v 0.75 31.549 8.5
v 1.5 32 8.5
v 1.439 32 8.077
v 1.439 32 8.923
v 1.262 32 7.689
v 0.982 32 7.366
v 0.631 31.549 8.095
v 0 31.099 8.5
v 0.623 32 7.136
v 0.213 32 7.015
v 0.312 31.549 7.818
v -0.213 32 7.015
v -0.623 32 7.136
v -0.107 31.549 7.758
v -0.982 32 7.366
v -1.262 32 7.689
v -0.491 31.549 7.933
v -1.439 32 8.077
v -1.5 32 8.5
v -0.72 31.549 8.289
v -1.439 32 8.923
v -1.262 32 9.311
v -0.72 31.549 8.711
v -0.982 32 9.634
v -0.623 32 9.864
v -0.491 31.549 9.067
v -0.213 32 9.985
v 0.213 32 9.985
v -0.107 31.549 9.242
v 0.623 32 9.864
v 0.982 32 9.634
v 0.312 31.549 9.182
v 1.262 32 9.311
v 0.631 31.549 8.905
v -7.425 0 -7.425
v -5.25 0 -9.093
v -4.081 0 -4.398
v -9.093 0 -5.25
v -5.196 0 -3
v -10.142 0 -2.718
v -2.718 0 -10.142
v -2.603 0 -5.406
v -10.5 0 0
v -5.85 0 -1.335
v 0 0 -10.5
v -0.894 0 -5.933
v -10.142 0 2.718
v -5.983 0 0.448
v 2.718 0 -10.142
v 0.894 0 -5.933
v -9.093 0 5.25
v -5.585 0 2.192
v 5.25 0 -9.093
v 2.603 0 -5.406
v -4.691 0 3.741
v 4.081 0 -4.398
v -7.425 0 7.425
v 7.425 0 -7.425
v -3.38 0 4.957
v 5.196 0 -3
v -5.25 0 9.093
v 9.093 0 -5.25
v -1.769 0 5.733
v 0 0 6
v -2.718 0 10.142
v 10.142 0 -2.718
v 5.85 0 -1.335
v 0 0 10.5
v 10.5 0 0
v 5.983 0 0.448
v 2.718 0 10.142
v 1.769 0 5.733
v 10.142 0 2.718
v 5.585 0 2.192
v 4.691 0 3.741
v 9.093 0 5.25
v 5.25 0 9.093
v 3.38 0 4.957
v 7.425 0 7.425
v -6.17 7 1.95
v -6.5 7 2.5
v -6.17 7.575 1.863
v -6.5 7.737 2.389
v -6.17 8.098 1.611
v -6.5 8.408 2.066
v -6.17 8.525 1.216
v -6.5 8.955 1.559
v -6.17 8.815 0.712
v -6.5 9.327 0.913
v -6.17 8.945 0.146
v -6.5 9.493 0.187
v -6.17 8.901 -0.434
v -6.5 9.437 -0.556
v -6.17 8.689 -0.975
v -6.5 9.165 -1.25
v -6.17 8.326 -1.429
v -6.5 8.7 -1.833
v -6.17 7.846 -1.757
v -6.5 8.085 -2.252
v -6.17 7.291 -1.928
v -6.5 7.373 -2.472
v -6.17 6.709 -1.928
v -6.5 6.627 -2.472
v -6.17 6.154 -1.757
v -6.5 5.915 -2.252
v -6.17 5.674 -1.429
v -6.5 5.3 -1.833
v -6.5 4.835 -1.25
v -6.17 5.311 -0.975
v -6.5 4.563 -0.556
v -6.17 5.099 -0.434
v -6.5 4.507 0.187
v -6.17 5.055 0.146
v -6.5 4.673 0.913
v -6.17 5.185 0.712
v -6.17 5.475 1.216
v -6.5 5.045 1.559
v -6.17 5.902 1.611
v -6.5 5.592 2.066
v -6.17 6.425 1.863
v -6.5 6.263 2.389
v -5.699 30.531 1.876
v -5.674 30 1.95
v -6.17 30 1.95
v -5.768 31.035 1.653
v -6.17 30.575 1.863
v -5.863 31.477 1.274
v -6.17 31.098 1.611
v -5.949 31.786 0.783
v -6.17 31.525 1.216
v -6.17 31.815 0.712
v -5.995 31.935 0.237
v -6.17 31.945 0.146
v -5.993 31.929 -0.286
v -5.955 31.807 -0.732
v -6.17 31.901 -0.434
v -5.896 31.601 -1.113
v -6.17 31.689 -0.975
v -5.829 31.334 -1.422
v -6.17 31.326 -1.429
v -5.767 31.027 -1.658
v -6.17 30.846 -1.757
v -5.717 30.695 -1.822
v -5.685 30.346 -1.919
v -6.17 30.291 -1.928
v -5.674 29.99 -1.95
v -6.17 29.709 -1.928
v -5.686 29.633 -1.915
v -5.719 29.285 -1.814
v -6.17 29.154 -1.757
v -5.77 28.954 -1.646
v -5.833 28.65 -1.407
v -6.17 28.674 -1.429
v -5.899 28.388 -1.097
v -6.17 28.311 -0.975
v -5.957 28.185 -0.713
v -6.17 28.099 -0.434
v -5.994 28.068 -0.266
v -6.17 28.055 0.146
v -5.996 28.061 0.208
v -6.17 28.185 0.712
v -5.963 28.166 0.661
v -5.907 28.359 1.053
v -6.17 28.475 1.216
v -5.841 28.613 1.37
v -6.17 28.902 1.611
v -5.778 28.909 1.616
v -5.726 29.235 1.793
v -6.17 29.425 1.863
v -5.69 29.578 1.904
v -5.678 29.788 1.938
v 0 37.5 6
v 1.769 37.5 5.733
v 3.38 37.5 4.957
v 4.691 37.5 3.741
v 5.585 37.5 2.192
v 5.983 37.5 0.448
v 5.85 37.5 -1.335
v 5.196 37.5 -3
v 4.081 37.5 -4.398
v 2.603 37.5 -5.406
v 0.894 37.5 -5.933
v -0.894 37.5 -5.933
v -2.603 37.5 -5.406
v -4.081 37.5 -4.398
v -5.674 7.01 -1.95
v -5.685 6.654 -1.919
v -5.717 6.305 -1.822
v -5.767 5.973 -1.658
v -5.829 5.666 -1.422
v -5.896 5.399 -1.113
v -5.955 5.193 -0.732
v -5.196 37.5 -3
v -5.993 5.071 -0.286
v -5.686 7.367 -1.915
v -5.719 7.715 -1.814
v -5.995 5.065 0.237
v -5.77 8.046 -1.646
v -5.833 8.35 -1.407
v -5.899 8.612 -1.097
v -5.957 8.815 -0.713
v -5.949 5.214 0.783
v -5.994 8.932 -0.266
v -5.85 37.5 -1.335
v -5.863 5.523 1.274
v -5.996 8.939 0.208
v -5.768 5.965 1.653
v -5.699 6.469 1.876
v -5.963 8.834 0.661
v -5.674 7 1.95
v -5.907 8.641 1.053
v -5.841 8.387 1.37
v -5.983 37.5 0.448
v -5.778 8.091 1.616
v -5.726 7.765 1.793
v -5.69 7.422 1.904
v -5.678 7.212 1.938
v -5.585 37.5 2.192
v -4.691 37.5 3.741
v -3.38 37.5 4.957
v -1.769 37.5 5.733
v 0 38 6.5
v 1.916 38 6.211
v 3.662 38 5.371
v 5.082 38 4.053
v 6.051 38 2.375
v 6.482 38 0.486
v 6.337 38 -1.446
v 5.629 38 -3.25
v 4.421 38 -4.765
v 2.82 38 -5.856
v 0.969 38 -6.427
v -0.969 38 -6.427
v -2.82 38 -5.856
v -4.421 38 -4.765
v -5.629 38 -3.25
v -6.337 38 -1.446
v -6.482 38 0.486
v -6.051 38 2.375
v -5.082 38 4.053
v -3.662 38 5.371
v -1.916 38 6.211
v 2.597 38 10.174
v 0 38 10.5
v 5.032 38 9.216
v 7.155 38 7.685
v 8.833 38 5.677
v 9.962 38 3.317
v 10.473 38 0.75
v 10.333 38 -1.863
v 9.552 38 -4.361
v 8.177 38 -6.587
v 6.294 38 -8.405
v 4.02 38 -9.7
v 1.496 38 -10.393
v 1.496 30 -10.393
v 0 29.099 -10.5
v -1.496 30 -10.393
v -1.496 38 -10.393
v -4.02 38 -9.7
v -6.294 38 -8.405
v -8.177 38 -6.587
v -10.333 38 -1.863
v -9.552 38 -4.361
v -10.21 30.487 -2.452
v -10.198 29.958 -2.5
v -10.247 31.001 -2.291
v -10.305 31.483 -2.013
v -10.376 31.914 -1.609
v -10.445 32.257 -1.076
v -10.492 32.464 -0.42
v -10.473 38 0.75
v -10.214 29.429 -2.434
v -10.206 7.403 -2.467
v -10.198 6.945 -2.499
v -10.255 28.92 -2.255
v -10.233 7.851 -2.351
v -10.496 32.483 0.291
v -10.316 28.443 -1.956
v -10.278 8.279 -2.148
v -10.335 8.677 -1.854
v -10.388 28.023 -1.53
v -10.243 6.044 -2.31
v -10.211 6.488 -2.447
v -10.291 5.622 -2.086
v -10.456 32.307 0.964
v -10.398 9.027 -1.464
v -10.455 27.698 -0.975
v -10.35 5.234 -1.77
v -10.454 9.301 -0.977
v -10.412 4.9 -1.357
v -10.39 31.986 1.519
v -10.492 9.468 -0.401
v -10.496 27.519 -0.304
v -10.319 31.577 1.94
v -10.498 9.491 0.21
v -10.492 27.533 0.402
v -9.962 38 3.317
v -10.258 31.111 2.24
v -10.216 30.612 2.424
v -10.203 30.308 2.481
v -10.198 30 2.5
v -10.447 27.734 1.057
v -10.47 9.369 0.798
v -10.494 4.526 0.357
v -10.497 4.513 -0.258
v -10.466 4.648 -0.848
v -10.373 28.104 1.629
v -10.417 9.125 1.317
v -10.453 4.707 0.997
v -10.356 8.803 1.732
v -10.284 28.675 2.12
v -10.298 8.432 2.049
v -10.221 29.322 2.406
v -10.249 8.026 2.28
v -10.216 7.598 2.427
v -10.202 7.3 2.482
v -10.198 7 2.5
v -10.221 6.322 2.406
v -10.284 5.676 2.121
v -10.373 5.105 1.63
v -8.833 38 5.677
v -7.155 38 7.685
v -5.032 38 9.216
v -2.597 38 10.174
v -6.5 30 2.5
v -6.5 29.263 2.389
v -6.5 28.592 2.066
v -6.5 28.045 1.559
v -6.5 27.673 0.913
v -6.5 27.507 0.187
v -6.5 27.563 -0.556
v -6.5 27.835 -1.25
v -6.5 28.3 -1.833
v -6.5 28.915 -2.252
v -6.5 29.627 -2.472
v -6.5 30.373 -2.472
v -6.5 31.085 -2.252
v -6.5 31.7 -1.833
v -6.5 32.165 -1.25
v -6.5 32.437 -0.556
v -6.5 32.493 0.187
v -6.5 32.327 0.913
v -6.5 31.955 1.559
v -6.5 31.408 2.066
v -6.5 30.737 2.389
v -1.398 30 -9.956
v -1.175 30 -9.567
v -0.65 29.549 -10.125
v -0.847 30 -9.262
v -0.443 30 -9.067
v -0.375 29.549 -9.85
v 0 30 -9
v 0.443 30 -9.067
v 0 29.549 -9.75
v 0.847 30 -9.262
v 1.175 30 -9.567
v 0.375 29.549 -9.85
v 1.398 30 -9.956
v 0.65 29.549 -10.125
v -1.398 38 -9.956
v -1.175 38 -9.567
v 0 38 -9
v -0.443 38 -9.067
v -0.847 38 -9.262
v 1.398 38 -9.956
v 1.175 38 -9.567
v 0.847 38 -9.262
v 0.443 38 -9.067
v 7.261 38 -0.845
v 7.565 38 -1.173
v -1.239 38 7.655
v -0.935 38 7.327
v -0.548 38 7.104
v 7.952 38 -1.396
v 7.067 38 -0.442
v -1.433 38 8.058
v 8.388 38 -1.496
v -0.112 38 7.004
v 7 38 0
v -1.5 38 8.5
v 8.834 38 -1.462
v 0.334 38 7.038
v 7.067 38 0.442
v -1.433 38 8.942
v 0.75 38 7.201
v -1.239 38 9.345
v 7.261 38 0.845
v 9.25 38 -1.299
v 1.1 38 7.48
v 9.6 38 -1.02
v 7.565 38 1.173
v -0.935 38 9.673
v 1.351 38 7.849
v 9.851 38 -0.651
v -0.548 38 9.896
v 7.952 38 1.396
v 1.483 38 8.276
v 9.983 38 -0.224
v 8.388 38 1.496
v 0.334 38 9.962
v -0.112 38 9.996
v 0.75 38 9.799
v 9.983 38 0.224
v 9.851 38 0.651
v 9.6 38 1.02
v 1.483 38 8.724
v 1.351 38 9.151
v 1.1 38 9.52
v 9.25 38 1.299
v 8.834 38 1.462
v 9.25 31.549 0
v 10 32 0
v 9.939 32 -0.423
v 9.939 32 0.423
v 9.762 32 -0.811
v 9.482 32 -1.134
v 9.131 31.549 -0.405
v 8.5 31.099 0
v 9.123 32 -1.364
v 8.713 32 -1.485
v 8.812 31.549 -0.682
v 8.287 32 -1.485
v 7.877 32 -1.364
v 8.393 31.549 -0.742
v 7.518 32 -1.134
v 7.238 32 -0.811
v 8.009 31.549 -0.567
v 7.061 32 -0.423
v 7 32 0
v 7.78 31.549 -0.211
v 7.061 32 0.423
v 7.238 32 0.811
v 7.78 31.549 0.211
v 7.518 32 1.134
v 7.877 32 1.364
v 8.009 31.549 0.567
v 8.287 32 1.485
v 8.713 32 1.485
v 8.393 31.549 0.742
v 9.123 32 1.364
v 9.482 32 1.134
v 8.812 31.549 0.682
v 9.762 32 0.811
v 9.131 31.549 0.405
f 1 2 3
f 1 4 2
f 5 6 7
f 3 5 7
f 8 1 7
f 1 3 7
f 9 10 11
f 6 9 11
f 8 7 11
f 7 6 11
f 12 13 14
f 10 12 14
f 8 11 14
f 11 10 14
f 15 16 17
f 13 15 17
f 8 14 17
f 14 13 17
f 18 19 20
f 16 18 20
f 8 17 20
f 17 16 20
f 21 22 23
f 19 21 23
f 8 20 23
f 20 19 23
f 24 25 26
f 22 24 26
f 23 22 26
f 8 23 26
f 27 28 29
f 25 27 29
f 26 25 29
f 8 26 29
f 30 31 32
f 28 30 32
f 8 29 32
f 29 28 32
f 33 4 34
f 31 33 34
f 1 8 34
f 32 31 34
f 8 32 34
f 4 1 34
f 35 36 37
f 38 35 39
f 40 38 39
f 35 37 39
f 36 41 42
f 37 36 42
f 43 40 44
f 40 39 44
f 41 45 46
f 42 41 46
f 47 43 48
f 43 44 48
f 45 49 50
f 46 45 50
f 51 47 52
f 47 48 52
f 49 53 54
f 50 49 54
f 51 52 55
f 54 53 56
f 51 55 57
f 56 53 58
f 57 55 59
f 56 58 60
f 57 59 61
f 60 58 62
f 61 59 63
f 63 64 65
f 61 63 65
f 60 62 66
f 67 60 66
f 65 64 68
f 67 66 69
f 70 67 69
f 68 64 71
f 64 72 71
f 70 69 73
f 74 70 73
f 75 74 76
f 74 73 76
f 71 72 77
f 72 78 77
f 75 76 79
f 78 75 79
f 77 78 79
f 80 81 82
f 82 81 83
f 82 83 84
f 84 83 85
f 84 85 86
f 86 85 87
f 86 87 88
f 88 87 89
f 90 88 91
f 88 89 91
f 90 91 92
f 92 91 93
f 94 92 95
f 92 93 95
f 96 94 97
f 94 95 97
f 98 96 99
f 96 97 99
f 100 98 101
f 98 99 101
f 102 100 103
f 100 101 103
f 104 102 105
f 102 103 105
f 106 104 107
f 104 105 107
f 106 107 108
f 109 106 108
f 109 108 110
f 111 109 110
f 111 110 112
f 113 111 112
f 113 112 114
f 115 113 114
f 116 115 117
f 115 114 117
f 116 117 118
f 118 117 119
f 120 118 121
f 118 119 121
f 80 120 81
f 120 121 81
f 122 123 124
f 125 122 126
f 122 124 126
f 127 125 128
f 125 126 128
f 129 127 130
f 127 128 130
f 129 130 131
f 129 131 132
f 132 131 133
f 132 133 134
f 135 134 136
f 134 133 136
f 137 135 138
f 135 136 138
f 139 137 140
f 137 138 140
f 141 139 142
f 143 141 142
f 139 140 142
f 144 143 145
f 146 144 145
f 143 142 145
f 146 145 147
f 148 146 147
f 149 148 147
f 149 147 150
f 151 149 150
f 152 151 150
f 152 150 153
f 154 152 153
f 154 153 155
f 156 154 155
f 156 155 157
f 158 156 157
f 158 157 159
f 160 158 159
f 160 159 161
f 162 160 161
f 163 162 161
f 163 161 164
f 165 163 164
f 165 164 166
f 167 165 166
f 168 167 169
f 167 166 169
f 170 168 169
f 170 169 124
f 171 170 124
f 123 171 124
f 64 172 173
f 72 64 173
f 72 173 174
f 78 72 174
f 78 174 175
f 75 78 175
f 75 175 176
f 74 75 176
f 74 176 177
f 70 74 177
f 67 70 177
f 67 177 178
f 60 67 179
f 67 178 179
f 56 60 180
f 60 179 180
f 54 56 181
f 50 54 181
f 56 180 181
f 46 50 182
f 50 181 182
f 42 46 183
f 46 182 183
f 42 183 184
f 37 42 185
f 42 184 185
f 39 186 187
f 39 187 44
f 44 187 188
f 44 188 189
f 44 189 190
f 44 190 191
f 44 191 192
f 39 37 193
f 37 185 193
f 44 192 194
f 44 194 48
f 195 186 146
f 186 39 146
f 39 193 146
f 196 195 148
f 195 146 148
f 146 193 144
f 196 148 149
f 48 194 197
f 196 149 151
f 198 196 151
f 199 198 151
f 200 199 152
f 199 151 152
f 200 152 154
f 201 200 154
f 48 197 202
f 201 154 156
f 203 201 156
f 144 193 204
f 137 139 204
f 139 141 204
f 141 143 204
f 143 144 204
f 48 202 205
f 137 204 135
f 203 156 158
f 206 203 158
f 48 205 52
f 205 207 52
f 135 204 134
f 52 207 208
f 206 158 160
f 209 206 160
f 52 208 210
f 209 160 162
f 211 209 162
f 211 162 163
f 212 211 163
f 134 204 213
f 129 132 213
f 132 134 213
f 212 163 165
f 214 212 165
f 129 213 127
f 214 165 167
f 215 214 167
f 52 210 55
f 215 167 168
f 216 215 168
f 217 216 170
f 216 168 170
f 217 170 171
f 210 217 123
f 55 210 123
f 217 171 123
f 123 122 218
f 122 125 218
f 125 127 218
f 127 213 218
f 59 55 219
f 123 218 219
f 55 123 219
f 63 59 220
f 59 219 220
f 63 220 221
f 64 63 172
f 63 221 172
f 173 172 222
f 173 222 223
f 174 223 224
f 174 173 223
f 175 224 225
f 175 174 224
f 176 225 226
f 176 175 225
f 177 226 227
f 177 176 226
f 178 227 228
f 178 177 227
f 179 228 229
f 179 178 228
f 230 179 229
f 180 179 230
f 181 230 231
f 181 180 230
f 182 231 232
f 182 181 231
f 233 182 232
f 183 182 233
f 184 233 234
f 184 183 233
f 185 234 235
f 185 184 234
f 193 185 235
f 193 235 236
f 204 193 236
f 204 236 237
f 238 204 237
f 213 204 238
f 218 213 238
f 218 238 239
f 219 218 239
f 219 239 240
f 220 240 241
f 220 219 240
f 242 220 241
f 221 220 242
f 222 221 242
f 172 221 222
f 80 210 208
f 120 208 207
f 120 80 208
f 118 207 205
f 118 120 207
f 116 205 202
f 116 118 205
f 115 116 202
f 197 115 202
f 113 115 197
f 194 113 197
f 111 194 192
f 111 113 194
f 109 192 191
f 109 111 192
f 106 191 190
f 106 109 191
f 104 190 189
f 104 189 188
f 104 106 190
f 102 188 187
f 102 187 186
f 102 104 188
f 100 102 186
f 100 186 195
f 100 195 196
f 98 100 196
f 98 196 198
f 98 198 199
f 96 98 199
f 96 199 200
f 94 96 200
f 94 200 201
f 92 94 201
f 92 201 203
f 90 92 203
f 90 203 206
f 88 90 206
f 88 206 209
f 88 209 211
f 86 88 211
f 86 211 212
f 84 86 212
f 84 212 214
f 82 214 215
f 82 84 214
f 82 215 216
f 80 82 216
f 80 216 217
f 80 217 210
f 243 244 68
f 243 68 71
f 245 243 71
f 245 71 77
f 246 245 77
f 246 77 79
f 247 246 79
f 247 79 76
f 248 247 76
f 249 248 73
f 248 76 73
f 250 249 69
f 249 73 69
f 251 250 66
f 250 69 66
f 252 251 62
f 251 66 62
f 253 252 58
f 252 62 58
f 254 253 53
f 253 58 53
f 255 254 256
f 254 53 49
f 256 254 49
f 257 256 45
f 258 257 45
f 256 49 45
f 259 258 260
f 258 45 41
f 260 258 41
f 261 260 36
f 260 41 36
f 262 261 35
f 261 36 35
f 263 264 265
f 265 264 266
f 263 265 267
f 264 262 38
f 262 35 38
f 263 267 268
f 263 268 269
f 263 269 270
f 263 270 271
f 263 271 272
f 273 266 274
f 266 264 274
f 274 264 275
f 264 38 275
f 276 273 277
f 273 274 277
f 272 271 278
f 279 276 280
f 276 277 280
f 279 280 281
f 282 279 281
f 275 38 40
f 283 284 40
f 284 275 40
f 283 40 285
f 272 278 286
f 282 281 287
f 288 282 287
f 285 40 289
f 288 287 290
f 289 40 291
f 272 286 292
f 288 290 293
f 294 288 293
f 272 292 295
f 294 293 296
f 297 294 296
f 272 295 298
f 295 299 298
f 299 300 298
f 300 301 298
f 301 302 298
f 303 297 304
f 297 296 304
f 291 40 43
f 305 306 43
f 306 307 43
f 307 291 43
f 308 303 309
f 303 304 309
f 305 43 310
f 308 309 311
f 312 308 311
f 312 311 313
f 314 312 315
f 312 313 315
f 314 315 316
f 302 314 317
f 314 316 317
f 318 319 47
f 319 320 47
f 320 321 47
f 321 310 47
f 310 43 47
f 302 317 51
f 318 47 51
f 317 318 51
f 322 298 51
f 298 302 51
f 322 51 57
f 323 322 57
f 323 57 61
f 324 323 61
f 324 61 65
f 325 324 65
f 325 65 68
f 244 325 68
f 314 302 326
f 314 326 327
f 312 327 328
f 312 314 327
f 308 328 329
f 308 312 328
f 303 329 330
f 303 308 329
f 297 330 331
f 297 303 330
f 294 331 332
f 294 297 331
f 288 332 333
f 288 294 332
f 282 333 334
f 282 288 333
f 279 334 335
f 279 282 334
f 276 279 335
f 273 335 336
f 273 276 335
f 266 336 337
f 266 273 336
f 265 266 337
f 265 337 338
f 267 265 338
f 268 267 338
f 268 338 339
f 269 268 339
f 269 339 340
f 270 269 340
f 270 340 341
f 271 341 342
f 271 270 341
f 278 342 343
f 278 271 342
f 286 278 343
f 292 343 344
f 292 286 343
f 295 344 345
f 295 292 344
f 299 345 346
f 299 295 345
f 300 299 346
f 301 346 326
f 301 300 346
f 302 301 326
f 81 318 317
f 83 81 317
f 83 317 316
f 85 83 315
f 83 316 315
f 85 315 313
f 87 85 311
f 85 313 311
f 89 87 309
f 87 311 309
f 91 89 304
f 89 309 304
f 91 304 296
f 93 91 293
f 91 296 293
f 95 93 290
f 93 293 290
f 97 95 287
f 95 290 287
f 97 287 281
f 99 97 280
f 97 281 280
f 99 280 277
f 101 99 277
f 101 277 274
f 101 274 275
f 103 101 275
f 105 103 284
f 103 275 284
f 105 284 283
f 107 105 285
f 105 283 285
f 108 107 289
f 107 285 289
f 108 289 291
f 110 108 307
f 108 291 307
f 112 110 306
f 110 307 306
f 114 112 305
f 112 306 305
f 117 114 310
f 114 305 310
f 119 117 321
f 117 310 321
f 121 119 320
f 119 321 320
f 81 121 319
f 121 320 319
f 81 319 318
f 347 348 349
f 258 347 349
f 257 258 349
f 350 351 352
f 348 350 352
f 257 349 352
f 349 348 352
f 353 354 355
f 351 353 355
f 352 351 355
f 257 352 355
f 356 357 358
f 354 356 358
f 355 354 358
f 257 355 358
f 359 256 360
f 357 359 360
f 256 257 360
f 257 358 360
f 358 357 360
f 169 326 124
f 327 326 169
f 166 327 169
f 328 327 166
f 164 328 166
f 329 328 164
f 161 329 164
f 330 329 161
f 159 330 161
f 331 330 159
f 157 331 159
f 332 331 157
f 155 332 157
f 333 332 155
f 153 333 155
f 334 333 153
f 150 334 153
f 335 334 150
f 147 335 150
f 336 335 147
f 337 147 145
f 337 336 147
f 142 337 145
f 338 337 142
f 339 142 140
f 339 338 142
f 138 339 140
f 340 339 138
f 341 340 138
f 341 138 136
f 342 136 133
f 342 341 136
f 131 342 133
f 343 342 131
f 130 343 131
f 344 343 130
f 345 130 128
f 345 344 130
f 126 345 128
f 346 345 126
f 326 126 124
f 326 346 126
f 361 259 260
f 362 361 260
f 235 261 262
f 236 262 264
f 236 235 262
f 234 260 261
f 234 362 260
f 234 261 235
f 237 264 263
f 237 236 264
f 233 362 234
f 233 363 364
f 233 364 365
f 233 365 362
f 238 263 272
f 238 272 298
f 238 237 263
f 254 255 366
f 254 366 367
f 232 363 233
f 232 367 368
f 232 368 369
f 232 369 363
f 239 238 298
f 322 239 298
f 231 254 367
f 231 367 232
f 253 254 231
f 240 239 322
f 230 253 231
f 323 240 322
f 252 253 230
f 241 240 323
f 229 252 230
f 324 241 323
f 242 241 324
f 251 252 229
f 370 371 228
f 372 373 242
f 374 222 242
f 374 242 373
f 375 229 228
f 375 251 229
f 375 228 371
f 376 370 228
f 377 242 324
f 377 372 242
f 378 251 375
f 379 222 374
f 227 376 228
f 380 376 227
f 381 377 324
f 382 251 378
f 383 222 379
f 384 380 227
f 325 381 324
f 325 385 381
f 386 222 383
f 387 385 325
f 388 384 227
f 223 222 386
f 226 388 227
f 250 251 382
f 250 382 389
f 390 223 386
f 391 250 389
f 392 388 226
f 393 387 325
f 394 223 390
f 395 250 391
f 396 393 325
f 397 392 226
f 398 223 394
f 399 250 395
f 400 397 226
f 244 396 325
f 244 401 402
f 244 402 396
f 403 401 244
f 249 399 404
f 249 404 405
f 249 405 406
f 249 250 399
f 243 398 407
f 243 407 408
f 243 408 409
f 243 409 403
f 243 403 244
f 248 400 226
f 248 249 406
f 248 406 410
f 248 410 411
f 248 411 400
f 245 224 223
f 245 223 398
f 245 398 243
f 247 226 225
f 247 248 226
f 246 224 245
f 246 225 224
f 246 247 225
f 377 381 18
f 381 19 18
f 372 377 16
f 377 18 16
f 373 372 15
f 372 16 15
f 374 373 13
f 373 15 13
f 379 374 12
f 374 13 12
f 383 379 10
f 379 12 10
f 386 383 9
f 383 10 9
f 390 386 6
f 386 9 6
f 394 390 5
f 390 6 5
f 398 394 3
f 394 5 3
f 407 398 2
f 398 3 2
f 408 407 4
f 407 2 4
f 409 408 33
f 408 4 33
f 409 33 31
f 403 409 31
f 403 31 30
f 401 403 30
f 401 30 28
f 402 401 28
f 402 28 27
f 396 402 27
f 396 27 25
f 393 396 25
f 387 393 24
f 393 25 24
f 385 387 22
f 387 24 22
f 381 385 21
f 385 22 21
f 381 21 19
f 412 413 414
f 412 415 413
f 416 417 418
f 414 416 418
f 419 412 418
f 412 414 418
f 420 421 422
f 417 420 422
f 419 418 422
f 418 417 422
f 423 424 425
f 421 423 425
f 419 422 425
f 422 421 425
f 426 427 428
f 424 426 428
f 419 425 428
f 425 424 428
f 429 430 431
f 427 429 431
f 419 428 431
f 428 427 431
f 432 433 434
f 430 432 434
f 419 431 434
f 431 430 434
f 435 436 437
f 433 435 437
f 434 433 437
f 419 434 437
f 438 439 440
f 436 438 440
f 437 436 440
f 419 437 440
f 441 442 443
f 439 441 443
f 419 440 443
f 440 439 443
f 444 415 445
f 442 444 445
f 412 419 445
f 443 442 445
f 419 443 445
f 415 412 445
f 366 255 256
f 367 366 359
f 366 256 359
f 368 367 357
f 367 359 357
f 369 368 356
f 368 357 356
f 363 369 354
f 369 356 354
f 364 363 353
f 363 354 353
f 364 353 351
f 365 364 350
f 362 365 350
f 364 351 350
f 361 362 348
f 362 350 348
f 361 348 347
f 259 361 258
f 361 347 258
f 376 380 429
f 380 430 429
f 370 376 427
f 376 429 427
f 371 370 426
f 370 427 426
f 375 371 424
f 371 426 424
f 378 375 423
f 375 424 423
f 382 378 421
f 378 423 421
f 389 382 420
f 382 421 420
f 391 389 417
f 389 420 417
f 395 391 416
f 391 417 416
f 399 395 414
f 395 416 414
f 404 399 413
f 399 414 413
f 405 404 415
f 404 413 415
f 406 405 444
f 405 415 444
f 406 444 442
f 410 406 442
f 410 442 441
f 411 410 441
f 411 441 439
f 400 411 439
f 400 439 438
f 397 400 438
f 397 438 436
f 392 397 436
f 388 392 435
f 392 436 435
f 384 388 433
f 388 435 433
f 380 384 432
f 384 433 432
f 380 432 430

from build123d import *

# Parameters (mm, degrees)
SKETCH1_R                       = 10.5
BOSS_EXTRUDE1_DEPTH             = 38
SKETCH2_R                       = 6
CUT_EXTRUDE1_DEPTH              = 41.798284278
F_3_9_3_9_DIAMETER_HOLE1_REACH  = 46.668
F_3_9_3_9_DIAMETER_HOLE1_BORE_R = 1.95
F_3_0MM_DOWEL_HOLE1_D           = 3
F_3_0MM_DOWEL_HOLE1_DEPTH       = 6
F_3_0MM_DOWEL_HOLE1_TIP         = 0.901290929
CHAMFER1_SIZE                   = 0.5
F_3_0MM_DOWEL_HOLE2_D           = 3
F_3_0MM_DOWEL_HOLE2_DEPTH       = 8
F_3_0MM_DOWEL_HOLE2_TIP         = 0.901290929


with BuildPart() as part:
    # Sketch1 → Boss-Extrude1 (new body)
    with BuildSketch(Plane(origin=(0, 0, 0), x_dir=(1, 0, 0), z_dir=(0, 1, 0))):
        with Locations(Location((0, 0, 0), (0, 0, 270))):
            Circle(SKETCH1_R)
    extrude(amount=BOSS_EXTRUDE1_DEPTH)

    # Sketch2 → Cut-Extrude1 (cut, through all)
    with BuildSketch(Plane(origin=(0, 38, 0), x_dir=(1, 0, 0), z_dir=(0, 1, 0))):
        with Locations(Location((0, 0, 0), (0, 0, 270))):
            Circle(SKETCH2_R)
    extrude(amount=-CUT_EXTRUDE1_DEPTH, mode=Mode.SUBTRACT)

    # Ø3.9 (3.9) Diameter Hole1 bore → Ø3.9 (3.9) Diameter Hole1 (cut, up to next)
    with BuildSketch(Plane.ZY.offset(10.5), mode=Mode.PRIVATE) as f_3_9_3_9_diameter_hole1_sk1:
        with Locations((0, 30)):
            Circle(F_3_9_3_9_DIAMETER_HOLE1_BORE_R)
    f_3_9_3_9_diameter_hole1_tool1 = extrude(f_3_9_3_9_diameter_hole1_sk1.sketch, amount=-F_3_9_3_9_DIAMETER_HOLE1_REACH, mode=Mode.PRIVATE) & part.part
    f_3_9_3_9_diameter_hole1 = f_3_9_3_9_diameter_hole1_tool1.solids().sort_by_distance((-10.5, 30, 0))[0]
    add(f_3_9_3_9_diameter_hole1, mode=Mode.SUBTRACT)

    # Sketch9 → Ø5.0mm Dowel Hole1 (revolve, cut)
    with BuildSketch(Plane(origin=(-10.5, 30, 0), x_dir=(0, 0, 1), z_dir=(0, 1, 0))):
        Polygon((0, 0), (0, 5.502151548), (2.5, 4), (2.5, 0), align=None)
    f_5_0mm_dowel_hole1 = revolve(axis=Axis((-16.85, 30, 0), (1, 0, 0)), mode=Mode.SUBTRACT)

    # Mirror1: Ø3.9 (3.9) Diameter Hole1, Ø5.0mm Dowel Hole1 across plane
    add(f_3_9_3_9_diameter_hole1.mirror(Plane(origin=(0, 18.5, 0), x_dir=(0, 0, 1), z_dir=(0, -1, 0))), mode=Mode.SUBTRACT)
    add(f_5_0mm_dowel_hole1.mirror(Plane(origin=(0, 18.5, 0), x_dir=(0, 0, 1), z_dir=(0, -1, 0))), mode=Mode.SUBTRACT)

    # Ø3.0mm Dowel Hole1
    with Locations(Plane(origin=(0, 38, 0), x_dir=(1, 0, 0), z_dir=(0, 1, 0))):
        with Locations((8.5, 0), (0, -8.5)):
            Hole(F_3_0MM_DOWEL_HOLE1_D / 2, depth=F_3_0MM_DOWEL_HOLE1_DEPTH)
            with Locations((0, 0, -(F_3_0MM_DOWEL_HOLE1_DEPTH + F_3_0MM_DOWEL_HOLE1_TIP / 2))):  # 118° drill point
                Cone(0, F_3_0MM_DOWEL_HOLE1_D / 2, F_3_0MM_DOWEL_HOLE1_TIP, mode=Mode.SUBTRACT)

    # Chamfer1
    chamfer1_edges = [part.edges().sort_by_distance(p)[0] for p in [
        (0, 38, -6),
    ]]
    chamfer(chamfer1_edges, length=CHAMFER1_SIZE)

    # Ø3.0mm Dowel Hole2
    with Locations(Plane(origin=(0, 38, 0), x_dir=(1, 0, 0), z_dir=(0, 1, 0))):
        with Locations((0, 10.5)):
            Hole(F_3_0MM_DOWEL_HOLE2_D / 2, depth=F_3_0MM_DOWEL_HOLE2_DEPTH)
            with Locations((0, 0, -(F_3_0MM_DOWEL_HOLE2_DEPTH + F_3_0MM_DOWEL_HOLE2_TIP / 2))):  # 118° drill point
                Cone(0, F_3_0MM_DOWEL_HOLE2_D / 2, F_3_0MM_DOWEL_HOLE2_TIP, mode=Mode.SUBTRACT)


solid = part.part
